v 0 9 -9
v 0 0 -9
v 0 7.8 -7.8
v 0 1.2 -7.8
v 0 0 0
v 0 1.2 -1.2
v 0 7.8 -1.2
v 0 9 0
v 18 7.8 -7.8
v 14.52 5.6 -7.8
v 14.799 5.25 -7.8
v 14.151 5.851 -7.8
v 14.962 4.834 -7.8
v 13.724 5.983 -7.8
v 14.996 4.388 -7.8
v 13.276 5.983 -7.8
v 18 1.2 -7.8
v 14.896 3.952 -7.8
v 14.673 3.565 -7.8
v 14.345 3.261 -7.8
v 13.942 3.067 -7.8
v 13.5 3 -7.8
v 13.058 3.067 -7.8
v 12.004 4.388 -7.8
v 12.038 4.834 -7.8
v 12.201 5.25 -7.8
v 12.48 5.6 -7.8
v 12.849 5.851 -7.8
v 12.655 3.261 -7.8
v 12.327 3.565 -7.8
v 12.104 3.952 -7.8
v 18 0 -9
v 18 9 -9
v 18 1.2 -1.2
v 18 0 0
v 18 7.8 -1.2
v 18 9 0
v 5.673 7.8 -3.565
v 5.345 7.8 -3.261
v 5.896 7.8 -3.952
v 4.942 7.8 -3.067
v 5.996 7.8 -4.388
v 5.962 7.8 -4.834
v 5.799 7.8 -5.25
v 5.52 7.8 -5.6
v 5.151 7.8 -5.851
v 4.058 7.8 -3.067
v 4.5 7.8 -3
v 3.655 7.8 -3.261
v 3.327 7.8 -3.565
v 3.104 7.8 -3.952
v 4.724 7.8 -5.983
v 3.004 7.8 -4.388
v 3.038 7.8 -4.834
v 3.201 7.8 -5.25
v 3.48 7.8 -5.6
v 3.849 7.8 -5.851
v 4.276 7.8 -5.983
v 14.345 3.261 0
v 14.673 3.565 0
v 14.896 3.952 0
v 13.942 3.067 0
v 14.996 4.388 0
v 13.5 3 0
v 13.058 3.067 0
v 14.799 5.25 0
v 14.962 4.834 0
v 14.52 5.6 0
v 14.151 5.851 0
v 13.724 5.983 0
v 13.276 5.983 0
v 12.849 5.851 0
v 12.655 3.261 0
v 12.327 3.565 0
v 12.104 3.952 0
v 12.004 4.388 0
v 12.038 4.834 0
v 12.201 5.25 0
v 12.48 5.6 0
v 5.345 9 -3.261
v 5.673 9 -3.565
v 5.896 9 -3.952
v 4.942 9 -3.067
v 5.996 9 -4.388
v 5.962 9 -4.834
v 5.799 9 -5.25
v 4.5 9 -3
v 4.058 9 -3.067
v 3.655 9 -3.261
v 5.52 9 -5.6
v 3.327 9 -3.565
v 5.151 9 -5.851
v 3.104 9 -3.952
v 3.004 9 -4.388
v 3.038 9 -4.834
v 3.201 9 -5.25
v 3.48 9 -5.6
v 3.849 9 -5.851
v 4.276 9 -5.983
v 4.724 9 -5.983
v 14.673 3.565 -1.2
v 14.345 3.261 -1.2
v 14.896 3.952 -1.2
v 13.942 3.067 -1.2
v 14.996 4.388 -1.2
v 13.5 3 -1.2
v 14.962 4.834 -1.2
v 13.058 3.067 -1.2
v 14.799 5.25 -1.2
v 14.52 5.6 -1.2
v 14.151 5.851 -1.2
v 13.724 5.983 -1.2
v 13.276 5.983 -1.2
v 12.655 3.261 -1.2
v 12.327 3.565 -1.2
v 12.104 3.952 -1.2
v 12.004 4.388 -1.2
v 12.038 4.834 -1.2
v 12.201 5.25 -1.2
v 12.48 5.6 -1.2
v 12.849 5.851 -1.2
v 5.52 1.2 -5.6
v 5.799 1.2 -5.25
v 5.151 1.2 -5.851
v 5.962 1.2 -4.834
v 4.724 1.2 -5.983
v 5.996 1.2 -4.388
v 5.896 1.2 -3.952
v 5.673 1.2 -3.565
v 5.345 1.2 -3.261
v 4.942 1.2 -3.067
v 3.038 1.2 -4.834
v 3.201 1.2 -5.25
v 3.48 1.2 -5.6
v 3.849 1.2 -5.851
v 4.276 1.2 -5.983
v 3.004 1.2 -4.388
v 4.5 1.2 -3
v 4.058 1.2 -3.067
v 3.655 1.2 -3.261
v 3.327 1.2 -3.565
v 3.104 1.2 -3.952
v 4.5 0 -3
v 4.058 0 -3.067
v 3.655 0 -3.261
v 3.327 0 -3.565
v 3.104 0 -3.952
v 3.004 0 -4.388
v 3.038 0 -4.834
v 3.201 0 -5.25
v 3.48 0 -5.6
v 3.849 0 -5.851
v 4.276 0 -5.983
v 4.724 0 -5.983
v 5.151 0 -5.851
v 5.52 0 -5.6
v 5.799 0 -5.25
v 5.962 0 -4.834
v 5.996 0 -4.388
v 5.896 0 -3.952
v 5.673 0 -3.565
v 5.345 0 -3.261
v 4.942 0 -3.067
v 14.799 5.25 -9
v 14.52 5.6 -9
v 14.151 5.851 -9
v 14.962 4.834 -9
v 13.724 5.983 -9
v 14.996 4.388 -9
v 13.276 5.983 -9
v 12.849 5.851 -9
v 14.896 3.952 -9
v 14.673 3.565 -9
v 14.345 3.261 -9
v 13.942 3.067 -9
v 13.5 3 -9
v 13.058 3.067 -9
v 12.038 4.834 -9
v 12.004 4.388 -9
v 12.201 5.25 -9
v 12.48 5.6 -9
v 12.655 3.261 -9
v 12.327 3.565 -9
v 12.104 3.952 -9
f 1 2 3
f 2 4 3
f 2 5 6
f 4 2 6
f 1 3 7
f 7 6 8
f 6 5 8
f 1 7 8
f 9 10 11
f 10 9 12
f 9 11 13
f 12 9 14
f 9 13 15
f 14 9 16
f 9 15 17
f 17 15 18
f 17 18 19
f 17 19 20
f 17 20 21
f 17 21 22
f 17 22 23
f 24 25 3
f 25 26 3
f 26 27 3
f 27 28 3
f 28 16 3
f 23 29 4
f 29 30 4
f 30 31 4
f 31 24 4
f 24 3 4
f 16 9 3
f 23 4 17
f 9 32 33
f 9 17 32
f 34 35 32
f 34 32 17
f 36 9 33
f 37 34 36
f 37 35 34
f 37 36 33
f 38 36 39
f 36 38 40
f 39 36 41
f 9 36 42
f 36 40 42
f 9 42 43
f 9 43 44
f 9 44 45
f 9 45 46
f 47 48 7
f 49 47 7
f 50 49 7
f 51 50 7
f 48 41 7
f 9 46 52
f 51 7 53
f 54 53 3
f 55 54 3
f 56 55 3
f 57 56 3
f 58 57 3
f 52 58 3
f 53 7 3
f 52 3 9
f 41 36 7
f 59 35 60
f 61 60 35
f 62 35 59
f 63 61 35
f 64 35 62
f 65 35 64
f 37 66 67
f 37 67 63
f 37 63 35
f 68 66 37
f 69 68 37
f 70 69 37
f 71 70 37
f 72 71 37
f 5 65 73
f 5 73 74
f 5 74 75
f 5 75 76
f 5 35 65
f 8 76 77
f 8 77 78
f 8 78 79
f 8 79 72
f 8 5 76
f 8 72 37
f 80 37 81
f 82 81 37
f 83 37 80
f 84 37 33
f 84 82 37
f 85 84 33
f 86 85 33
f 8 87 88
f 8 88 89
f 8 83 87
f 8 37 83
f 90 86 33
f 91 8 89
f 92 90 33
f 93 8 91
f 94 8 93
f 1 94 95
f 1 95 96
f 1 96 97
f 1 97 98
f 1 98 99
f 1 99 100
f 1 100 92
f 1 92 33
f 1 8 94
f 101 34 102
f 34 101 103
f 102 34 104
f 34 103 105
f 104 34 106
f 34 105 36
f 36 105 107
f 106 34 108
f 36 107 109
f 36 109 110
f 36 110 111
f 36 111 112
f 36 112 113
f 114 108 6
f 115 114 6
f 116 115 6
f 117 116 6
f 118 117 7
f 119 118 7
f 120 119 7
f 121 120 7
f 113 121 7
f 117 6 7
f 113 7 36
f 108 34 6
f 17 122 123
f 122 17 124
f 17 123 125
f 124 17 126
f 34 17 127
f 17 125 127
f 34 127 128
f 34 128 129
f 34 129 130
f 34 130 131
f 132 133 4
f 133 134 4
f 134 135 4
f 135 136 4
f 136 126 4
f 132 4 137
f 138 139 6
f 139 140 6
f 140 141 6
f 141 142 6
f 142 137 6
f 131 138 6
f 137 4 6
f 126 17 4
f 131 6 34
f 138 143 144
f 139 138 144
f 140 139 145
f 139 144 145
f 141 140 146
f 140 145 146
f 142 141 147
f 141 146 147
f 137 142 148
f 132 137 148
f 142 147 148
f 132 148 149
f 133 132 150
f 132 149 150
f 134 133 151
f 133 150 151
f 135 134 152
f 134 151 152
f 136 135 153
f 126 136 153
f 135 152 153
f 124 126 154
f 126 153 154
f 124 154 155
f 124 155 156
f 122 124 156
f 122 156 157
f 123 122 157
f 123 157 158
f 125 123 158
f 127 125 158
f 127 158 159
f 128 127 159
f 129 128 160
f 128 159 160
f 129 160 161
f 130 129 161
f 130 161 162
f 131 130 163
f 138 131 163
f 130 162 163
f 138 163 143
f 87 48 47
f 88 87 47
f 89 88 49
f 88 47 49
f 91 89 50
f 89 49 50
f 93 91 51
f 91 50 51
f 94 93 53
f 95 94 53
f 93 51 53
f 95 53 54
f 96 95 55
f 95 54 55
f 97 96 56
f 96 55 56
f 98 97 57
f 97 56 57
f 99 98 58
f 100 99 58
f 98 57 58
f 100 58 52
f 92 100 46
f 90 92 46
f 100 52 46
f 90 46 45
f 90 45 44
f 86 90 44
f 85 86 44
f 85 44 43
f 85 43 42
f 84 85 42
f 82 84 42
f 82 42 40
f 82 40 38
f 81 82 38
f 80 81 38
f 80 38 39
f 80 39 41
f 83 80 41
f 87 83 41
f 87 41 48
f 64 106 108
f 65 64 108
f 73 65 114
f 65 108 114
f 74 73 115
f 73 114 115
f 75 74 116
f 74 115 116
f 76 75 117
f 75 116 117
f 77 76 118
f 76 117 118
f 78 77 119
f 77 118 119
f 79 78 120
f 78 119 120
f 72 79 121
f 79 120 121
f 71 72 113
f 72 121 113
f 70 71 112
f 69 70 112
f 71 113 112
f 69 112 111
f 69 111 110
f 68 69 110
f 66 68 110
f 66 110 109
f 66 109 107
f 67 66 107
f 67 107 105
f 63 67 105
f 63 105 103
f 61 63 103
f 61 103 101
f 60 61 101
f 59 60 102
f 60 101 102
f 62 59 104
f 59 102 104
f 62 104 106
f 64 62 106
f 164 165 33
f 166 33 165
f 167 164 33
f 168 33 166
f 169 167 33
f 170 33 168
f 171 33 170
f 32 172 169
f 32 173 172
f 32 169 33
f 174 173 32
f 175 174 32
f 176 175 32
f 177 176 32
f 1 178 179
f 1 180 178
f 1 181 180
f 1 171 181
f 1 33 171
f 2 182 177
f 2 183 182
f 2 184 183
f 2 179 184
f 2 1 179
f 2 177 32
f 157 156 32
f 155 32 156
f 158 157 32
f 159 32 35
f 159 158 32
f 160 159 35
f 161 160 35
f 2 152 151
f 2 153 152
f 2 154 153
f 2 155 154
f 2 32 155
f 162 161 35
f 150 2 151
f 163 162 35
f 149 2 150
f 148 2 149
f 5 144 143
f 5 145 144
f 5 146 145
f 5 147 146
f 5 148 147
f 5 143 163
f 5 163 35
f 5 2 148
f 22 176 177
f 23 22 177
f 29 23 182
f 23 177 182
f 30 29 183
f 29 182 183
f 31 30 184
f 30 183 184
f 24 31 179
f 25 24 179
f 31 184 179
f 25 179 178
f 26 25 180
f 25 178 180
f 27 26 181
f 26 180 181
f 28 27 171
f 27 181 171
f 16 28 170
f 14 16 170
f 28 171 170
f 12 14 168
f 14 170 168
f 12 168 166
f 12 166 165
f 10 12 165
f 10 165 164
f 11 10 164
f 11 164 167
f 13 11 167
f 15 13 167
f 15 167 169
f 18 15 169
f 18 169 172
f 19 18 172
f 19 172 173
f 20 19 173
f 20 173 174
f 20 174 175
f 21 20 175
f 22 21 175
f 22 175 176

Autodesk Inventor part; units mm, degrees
ref_plane "YZ Plane" through (0, 0, 0) normal (1, 0, 0) x (0, 1, 0)
ref_plane "XZ Plane" through (0, 0, 0) normal (0, 1, 0) x (-1, 0, 0)
ref_plane "XY Plane" through (0, 0, 0) normal (0, 0, 1) x (1, 0, 0)
sketch "スケッチ1" plane through (0, 0, 0) normal (1, 0, 0) x (0, 1, 0)
  line L0 (0, 0) -> (9, 0)
  line L1 (9, 0) -> (9, -9)
  line L2 (9, -9) -> (0, -9)
  line L3 (0, -9) -> (0, 0)
  line L4 (1.2, -1.2) -> (7.8, -1.2)
  line L5 (7.8, -1.2) -> (7.8, -7.8)
  line L6 (7.8, -7.8) -> (1.2, -7.8)
  line L7 (1.2, -7.8) -> (1.2, -1.2)
  dimension "d0" = 9
  dimension "d1" = 9
  dimension "d3" = 1.2
  dimension "d5" = 1.2
  dimension "d6" = 1.2
  dimension "d7" = 1.2
extrude "押し出し1" add sketch "スケッチ1" along normal blind 18
sketch "スケッチ2" plane through (0, 9, 0) normal (0, 1, 0) x (1, 0, 0)
  line L0 (0, 9) -> (0, 0) projected
  line L1 (0, 9) -> (18, 9) projected
  point P0 (4.5, 4.5)
  dimension "d10" = 4.5
  dimension "d11" = 4.5
hole "穴1" at (4.5, 9, -4.5) direction (0, -1, 0) diameter 3 end through all
sketch "スケッチ3" plane through (0, 0, 0) normal (0, 0, 1) x (1, 0, 0)
  line L0 (0, 0) -> (18, 0) projected
  line L1 (0, 9) -> (0, 0) projected
  point P0 (13.5, 4.5)
  dimension "d19" = 4.5
  dimension "d20" = 13.5
hole "穴2" at (13.5, 4.5, 0) direction (0, 0, -1) diameter 3 end through all
equation "\"d5\" = d3"
equation "\"d6\" = d3"
equation "\"d7\" = d3"
properties part number "ロボット回転9x9x18" material "アルミニウム 6061"
